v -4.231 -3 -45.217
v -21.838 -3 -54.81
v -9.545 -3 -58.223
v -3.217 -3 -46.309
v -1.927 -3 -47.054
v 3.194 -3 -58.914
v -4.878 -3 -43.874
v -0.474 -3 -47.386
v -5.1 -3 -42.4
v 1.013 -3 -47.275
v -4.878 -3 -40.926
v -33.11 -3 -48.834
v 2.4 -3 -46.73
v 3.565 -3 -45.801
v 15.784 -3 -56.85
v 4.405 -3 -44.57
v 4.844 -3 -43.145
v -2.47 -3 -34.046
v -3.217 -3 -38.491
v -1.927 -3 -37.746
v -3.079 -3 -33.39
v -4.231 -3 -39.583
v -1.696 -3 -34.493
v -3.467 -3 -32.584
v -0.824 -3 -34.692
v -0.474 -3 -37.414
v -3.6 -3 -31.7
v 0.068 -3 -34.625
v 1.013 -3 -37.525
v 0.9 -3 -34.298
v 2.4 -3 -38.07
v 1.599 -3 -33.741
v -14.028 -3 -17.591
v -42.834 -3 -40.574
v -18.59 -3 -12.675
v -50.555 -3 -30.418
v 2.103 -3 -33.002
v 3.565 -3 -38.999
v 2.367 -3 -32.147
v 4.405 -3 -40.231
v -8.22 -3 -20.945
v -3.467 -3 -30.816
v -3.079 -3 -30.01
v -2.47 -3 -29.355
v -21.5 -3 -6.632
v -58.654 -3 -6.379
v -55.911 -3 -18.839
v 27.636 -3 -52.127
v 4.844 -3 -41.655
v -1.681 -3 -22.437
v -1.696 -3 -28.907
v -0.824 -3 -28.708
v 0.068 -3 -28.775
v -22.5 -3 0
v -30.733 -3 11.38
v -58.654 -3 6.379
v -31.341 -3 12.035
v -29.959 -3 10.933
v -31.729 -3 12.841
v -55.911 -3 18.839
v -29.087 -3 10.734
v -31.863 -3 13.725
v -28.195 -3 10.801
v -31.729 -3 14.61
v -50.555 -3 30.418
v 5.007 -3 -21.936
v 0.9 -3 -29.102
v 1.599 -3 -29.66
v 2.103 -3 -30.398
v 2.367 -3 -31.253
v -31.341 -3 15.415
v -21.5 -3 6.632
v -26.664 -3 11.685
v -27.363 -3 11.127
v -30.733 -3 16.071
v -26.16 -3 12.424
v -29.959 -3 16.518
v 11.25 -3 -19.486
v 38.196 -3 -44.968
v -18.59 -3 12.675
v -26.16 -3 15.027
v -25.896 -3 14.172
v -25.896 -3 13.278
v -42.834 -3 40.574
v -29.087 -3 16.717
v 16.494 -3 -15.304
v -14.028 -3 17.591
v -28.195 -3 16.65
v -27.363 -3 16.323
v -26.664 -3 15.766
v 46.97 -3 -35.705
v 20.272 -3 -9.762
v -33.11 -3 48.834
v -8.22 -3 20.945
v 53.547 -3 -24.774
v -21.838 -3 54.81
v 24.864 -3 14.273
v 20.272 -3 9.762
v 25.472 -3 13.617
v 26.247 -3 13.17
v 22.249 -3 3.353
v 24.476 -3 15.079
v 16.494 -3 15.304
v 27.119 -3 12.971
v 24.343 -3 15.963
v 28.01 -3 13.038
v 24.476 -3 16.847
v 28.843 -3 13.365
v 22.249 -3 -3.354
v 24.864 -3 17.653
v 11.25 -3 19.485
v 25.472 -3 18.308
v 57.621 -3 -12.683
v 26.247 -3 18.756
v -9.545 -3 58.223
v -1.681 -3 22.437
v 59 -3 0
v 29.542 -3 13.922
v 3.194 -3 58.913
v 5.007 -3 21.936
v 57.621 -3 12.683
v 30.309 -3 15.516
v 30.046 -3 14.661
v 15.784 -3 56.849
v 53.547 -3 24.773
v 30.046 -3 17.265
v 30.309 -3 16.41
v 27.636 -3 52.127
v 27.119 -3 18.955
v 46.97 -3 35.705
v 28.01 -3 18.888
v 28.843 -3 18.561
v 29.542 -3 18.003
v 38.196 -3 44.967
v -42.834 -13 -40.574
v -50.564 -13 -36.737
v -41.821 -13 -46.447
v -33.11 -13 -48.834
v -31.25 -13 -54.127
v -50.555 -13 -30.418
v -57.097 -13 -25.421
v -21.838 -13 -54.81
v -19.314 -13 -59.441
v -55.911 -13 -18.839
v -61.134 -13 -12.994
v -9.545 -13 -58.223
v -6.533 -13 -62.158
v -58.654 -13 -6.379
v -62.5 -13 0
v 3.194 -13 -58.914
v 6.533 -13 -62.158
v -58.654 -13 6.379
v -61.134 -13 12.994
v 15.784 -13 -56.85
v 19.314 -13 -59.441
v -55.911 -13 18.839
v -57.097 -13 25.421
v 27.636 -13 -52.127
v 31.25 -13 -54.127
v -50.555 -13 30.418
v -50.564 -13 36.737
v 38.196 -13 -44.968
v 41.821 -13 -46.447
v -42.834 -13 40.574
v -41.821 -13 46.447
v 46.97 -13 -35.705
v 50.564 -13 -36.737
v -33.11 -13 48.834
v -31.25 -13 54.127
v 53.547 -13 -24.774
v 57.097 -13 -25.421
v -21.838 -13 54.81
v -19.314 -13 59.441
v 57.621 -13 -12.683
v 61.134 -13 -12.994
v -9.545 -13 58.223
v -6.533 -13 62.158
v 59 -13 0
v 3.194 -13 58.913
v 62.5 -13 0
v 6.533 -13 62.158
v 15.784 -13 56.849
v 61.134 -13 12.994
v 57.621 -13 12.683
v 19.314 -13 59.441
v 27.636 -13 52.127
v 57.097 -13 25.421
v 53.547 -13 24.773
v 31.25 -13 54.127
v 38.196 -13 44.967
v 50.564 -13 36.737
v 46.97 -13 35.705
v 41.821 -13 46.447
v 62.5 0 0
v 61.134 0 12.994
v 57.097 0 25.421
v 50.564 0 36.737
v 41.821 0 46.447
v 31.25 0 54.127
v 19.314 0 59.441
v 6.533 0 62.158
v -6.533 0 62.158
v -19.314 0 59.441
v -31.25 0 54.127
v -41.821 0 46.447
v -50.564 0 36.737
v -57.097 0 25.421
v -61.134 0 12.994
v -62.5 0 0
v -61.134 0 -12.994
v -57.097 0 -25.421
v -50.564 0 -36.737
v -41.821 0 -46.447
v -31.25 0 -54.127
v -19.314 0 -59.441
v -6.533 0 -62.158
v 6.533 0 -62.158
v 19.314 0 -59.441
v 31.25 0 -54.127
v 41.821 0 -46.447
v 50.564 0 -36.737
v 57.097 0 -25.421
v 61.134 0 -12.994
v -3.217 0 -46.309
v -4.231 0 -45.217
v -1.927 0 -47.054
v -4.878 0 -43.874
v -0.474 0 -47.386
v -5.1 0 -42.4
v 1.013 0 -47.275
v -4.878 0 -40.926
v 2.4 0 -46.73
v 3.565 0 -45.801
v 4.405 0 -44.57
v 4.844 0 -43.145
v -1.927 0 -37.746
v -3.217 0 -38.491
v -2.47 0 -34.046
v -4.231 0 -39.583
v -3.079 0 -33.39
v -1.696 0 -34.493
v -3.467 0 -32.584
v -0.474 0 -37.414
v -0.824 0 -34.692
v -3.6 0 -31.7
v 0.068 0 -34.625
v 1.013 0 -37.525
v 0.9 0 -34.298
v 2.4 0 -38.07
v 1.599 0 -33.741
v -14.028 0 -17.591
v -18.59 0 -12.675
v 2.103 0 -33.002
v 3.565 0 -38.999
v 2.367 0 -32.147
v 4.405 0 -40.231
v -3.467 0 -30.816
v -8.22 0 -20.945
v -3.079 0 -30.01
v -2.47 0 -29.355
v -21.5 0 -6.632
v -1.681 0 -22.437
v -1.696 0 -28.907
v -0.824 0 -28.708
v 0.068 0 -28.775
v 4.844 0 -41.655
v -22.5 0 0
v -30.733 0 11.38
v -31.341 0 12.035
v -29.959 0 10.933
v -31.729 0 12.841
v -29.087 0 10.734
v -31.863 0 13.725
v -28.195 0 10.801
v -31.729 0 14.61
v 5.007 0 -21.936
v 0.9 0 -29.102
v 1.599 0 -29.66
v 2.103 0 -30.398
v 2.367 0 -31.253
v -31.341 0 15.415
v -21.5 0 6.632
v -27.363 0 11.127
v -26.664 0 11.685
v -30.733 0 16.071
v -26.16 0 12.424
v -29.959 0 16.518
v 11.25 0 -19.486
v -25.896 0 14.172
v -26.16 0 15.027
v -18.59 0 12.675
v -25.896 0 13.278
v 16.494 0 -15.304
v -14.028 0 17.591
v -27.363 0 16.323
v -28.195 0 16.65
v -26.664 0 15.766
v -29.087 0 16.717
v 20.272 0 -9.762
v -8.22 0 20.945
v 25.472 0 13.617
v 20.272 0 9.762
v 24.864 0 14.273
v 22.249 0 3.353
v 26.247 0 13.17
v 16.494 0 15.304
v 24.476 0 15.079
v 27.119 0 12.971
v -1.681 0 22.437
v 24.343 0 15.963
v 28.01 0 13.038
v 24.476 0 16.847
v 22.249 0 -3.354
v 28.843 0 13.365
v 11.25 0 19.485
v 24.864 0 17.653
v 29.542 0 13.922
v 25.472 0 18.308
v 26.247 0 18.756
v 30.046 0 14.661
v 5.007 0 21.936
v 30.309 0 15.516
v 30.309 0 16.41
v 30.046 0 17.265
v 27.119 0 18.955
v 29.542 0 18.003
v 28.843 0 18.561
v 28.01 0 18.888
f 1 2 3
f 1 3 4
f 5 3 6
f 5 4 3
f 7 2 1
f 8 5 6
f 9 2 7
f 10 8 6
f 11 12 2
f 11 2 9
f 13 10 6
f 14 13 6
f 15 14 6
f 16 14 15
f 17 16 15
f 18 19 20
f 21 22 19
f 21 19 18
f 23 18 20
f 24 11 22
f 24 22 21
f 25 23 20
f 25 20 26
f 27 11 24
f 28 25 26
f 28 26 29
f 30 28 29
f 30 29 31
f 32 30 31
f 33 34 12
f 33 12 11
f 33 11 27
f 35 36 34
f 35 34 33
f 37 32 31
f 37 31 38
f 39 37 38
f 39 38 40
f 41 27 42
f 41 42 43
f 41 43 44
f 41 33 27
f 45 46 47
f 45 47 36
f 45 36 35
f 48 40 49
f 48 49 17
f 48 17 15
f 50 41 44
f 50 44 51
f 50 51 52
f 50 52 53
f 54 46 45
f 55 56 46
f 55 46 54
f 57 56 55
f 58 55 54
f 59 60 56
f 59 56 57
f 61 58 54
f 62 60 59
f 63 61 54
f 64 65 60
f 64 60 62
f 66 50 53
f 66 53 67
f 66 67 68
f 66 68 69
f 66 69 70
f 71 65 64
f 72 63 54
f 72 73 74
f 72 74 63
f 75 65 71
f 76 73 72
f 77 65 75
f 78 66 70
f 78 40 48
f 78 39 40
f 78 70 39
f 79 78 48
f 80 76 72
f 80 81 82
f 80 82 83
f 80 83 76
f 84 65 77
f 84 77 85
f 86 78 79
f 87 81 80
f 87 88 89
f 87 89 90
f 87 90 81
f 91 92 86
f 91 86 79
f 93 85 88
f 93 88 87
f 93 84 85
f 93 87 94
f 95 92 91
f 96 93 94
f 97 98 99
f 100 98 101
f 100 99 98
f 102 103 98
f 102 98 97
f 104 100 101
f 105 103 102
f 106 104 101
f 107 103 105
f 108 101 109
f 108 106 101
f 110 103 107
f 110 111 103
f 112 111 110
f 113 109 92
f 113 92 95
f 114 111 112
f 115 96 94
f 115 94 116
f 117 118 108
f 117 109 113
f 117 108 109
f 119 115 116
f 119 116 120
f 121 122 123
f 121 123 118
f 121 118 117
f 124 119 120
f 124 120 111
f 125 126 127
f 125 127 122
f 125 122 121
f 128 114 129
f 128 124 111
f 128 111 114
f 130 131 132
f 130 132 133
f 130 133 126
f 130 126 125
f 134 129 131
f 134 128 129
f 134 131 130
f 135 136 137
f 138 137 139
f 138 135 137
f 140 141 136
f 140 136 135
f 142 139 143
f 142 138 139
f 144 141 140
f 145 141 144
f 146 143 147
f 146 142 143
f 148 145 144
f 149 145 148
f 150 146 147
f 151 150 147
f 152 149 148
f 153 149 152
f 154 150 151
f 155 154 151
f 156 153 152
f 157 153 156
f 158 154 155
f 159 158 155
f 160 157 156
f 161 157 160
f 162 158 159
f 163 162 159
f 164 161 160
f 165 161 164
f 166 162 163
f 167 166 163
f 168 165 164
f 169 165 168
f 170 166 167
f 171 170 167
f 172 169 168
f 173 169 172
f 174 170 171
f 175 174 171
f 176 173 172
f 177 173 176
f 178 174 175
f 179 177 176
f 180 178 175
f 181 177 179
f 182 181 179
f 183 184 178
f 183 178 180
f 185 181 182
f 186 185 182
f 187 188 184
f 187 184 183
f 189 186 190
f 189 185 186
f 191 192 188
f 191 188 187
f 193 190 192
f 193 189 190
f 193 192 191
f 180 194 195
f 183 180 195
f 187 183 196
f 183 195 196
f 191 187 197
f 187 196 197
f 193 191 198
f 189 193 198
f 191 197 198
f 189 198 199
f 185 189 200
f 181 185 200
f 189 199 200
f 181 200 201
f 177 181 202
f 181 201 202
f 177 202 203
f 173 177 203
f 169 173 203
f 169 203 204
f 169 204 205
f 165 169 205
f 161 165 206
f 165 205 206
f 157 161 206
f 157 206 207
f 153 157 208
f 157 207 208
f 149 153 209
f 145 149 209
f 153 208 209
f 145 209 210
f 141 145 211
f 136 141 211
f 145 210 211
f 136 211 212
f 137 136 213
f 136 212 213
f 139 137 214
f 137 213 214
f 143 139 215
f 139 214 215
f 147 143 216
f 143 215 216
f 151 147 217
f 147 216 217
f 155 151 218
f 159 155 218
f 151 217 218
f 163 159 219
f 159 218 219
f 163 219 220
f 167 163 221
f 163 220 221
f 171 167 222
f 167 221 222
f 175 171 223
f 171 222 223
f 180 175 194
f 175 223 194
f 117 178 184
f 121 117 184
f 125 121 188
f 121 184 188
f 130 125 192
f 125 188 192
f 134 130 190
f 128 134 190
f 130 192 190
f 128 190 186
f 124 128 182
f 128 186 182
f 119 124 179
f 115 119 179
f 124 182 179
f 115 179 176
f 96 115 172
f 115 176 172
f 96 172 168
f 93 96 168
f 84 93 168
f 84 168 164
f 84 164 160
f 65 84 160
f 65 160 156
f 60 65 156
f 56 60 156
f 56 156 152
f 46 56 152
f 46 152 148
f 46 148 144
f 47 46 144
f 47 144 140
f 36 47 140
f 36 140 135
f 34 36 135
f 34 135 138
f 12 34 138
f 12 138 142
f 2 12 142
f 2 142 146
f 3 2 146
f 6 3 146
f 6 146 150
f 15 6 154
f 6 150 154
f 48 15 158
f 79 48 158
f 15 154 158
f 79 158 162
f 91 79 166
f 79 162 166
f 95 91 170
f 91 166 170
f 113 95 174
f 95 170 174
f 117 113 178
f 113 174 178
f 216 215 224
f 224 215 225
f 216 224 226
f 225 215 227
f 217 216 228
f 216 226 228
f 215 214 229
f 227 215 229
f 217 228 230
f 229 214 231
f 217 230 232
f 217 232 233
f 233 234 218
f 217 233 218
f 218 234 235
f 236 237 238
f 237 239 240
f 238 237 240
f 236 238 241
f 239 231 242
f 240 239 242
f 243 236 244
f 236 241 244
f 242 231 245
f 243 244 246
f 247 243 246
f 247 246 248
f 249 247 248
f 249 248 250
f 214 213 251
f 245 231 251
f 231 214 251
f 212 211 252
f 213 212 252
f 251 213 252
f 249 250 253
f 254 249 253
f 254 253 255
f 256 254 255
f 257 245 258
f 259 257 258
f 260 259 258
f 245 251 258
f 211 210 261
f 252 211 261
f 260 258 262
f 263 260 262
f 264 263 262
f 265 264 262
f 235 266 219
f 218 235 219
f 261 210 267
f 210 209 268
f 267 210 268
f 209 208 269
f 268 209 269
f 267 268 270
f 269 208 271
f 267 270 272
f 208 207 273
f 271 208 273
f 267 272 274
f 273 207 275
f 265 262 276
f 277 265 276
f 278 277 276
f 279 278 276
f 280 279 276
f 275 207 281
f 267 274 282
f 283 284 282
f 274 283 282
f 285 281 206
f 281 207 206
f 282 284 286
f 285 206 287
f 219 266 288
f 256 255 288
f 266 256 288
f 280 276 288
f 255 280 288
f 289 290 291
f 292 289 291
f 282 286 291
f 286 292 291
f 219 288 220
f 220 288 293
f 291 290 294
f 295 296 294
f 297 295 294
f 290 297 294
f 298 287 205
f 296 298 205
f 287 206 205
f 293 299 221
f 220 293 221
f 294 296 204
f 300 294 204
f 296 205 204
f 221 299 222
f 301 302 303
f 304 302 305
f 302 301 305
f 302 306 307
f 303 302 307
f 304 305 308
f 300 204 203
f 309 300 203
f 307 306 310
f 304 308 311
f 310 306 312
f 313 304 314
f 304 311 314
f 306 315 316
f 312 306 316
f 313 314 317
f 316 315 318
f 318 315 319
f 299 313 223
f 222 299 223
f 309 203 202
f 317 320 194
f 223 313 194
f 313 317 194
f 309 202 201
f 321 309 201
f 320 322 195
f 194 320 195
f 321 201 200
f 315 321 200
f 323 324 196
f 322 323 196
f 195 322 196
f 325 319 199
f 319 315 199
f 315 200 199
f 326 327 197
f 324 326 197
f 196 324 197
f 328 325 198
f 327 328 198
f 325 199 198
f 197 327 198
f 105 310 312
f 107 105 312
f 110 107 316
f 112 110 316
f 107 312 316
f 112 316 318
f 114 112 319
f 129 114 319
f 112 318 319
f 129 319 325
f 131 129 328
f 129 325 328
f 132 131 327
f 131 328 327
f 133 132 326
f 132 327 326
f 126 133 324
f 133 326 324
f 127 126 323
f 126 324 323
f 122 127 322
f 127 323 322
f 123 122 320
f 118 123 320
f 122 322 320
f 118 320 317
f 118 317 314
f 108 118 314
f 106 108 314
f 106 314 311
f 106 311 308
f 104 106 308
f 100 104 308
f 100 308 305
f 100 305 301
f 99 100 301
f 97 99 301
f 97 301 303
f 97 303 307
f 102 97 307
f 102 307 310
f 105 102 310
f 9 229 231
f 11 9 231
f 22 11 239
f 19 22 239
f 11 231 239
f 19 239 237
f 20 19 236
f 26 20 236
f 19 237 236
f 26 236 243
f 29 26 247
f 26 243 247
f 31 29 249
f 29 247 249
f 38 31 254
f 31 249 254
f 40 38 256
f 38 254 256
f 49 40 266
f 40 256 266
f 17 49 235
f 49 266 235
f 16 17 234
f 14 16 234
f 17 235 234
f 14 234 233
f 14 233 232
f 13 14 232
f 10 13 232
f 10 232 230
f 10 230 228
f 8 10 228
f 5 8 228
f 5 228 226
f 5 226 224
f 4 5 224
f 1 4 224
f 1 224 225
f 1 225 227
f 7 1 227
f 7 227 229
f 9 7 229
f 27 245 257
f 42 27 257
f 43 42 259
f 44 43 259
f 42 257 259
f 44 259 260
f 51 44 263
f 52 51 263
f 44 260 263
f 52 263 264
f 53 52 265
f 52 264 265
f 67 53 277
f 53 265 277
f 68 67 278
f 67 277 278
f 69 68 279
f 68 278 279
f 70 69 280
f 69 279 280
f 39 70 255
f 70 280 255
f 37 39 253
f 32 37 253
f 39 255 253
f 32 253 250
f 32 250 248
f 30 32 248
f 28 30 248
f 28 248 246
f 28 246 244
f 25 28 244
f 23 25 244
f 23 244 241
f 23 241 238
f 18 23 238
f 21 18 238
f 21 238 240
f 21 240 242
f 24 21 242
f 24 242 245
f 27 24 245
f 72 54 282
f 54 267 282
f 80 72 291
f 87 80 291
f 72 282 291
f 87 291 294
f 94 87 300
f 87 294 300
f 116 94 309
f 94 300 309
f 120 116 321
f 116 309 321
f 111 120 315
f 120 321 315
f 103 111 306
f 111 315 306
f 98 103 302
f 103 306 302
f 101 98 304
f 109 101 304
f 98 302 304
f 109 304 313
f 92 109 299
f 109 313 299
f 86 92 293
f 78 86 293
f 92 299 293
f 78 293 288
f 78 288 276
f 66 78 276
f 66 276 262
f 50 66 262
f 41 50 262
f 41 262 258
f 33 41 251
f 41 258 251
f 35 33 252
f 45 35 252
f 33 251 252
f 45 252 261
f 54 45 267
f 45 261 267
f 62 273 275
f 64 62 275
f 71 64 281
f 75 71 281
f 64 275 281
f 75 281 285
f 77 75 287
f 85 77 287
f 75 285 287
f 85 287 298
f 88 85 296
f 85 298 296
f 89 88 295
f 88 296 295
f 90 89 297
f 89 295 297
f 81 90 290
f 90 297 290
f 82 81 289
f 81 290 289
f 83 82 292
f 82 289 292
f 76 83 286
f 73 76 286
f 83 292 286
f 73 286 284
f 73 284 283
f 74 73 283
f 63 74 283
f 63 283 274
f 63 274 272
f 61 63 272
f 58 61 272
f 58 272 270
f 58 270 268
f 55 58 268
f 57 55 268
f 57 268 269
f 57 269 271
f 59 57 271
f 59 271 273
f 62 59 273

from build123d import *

# Parameters (mm, degrees)
F0_R           = 62.5
F1_DEPTH       = 13
F3_D           = 6
F4_D           = 45
F4_CBORE_D     = 118
F4_CBORE_DEPTH = 10
F5_D           = 10


with BuildPart() as f1:
    # F0 (on Front) → F1 (new body)
    with BuildSketch(Plane.XZ):
        Circle(F0_R)
    extrude(amount=F1_DEPTH)

    # F3 (through all)
    with Locations(Plane.XZ.offset(13)):
        with Locations((-28.862715, 13.725307), (27.342759, 15.962977), (-0.599952, -31.700085)):
            Hole(F3_D / 2)

    # F4 (through all)
    with Locations(Plane.XZ.offset(13)):
        with Locations((4.8e-05, -8.5e-05)):
            CounterBoreHole(F4_D / 2, F4_CBORE_D / 2, F4_CBORE_DEPTH)

    # F5 (through all)
    with Locations(Plane.XZ.offset(13)):
        with Locations((-0.099952, -42.400085)):
            Hole(F5_D / 2)


solid = f1.part
